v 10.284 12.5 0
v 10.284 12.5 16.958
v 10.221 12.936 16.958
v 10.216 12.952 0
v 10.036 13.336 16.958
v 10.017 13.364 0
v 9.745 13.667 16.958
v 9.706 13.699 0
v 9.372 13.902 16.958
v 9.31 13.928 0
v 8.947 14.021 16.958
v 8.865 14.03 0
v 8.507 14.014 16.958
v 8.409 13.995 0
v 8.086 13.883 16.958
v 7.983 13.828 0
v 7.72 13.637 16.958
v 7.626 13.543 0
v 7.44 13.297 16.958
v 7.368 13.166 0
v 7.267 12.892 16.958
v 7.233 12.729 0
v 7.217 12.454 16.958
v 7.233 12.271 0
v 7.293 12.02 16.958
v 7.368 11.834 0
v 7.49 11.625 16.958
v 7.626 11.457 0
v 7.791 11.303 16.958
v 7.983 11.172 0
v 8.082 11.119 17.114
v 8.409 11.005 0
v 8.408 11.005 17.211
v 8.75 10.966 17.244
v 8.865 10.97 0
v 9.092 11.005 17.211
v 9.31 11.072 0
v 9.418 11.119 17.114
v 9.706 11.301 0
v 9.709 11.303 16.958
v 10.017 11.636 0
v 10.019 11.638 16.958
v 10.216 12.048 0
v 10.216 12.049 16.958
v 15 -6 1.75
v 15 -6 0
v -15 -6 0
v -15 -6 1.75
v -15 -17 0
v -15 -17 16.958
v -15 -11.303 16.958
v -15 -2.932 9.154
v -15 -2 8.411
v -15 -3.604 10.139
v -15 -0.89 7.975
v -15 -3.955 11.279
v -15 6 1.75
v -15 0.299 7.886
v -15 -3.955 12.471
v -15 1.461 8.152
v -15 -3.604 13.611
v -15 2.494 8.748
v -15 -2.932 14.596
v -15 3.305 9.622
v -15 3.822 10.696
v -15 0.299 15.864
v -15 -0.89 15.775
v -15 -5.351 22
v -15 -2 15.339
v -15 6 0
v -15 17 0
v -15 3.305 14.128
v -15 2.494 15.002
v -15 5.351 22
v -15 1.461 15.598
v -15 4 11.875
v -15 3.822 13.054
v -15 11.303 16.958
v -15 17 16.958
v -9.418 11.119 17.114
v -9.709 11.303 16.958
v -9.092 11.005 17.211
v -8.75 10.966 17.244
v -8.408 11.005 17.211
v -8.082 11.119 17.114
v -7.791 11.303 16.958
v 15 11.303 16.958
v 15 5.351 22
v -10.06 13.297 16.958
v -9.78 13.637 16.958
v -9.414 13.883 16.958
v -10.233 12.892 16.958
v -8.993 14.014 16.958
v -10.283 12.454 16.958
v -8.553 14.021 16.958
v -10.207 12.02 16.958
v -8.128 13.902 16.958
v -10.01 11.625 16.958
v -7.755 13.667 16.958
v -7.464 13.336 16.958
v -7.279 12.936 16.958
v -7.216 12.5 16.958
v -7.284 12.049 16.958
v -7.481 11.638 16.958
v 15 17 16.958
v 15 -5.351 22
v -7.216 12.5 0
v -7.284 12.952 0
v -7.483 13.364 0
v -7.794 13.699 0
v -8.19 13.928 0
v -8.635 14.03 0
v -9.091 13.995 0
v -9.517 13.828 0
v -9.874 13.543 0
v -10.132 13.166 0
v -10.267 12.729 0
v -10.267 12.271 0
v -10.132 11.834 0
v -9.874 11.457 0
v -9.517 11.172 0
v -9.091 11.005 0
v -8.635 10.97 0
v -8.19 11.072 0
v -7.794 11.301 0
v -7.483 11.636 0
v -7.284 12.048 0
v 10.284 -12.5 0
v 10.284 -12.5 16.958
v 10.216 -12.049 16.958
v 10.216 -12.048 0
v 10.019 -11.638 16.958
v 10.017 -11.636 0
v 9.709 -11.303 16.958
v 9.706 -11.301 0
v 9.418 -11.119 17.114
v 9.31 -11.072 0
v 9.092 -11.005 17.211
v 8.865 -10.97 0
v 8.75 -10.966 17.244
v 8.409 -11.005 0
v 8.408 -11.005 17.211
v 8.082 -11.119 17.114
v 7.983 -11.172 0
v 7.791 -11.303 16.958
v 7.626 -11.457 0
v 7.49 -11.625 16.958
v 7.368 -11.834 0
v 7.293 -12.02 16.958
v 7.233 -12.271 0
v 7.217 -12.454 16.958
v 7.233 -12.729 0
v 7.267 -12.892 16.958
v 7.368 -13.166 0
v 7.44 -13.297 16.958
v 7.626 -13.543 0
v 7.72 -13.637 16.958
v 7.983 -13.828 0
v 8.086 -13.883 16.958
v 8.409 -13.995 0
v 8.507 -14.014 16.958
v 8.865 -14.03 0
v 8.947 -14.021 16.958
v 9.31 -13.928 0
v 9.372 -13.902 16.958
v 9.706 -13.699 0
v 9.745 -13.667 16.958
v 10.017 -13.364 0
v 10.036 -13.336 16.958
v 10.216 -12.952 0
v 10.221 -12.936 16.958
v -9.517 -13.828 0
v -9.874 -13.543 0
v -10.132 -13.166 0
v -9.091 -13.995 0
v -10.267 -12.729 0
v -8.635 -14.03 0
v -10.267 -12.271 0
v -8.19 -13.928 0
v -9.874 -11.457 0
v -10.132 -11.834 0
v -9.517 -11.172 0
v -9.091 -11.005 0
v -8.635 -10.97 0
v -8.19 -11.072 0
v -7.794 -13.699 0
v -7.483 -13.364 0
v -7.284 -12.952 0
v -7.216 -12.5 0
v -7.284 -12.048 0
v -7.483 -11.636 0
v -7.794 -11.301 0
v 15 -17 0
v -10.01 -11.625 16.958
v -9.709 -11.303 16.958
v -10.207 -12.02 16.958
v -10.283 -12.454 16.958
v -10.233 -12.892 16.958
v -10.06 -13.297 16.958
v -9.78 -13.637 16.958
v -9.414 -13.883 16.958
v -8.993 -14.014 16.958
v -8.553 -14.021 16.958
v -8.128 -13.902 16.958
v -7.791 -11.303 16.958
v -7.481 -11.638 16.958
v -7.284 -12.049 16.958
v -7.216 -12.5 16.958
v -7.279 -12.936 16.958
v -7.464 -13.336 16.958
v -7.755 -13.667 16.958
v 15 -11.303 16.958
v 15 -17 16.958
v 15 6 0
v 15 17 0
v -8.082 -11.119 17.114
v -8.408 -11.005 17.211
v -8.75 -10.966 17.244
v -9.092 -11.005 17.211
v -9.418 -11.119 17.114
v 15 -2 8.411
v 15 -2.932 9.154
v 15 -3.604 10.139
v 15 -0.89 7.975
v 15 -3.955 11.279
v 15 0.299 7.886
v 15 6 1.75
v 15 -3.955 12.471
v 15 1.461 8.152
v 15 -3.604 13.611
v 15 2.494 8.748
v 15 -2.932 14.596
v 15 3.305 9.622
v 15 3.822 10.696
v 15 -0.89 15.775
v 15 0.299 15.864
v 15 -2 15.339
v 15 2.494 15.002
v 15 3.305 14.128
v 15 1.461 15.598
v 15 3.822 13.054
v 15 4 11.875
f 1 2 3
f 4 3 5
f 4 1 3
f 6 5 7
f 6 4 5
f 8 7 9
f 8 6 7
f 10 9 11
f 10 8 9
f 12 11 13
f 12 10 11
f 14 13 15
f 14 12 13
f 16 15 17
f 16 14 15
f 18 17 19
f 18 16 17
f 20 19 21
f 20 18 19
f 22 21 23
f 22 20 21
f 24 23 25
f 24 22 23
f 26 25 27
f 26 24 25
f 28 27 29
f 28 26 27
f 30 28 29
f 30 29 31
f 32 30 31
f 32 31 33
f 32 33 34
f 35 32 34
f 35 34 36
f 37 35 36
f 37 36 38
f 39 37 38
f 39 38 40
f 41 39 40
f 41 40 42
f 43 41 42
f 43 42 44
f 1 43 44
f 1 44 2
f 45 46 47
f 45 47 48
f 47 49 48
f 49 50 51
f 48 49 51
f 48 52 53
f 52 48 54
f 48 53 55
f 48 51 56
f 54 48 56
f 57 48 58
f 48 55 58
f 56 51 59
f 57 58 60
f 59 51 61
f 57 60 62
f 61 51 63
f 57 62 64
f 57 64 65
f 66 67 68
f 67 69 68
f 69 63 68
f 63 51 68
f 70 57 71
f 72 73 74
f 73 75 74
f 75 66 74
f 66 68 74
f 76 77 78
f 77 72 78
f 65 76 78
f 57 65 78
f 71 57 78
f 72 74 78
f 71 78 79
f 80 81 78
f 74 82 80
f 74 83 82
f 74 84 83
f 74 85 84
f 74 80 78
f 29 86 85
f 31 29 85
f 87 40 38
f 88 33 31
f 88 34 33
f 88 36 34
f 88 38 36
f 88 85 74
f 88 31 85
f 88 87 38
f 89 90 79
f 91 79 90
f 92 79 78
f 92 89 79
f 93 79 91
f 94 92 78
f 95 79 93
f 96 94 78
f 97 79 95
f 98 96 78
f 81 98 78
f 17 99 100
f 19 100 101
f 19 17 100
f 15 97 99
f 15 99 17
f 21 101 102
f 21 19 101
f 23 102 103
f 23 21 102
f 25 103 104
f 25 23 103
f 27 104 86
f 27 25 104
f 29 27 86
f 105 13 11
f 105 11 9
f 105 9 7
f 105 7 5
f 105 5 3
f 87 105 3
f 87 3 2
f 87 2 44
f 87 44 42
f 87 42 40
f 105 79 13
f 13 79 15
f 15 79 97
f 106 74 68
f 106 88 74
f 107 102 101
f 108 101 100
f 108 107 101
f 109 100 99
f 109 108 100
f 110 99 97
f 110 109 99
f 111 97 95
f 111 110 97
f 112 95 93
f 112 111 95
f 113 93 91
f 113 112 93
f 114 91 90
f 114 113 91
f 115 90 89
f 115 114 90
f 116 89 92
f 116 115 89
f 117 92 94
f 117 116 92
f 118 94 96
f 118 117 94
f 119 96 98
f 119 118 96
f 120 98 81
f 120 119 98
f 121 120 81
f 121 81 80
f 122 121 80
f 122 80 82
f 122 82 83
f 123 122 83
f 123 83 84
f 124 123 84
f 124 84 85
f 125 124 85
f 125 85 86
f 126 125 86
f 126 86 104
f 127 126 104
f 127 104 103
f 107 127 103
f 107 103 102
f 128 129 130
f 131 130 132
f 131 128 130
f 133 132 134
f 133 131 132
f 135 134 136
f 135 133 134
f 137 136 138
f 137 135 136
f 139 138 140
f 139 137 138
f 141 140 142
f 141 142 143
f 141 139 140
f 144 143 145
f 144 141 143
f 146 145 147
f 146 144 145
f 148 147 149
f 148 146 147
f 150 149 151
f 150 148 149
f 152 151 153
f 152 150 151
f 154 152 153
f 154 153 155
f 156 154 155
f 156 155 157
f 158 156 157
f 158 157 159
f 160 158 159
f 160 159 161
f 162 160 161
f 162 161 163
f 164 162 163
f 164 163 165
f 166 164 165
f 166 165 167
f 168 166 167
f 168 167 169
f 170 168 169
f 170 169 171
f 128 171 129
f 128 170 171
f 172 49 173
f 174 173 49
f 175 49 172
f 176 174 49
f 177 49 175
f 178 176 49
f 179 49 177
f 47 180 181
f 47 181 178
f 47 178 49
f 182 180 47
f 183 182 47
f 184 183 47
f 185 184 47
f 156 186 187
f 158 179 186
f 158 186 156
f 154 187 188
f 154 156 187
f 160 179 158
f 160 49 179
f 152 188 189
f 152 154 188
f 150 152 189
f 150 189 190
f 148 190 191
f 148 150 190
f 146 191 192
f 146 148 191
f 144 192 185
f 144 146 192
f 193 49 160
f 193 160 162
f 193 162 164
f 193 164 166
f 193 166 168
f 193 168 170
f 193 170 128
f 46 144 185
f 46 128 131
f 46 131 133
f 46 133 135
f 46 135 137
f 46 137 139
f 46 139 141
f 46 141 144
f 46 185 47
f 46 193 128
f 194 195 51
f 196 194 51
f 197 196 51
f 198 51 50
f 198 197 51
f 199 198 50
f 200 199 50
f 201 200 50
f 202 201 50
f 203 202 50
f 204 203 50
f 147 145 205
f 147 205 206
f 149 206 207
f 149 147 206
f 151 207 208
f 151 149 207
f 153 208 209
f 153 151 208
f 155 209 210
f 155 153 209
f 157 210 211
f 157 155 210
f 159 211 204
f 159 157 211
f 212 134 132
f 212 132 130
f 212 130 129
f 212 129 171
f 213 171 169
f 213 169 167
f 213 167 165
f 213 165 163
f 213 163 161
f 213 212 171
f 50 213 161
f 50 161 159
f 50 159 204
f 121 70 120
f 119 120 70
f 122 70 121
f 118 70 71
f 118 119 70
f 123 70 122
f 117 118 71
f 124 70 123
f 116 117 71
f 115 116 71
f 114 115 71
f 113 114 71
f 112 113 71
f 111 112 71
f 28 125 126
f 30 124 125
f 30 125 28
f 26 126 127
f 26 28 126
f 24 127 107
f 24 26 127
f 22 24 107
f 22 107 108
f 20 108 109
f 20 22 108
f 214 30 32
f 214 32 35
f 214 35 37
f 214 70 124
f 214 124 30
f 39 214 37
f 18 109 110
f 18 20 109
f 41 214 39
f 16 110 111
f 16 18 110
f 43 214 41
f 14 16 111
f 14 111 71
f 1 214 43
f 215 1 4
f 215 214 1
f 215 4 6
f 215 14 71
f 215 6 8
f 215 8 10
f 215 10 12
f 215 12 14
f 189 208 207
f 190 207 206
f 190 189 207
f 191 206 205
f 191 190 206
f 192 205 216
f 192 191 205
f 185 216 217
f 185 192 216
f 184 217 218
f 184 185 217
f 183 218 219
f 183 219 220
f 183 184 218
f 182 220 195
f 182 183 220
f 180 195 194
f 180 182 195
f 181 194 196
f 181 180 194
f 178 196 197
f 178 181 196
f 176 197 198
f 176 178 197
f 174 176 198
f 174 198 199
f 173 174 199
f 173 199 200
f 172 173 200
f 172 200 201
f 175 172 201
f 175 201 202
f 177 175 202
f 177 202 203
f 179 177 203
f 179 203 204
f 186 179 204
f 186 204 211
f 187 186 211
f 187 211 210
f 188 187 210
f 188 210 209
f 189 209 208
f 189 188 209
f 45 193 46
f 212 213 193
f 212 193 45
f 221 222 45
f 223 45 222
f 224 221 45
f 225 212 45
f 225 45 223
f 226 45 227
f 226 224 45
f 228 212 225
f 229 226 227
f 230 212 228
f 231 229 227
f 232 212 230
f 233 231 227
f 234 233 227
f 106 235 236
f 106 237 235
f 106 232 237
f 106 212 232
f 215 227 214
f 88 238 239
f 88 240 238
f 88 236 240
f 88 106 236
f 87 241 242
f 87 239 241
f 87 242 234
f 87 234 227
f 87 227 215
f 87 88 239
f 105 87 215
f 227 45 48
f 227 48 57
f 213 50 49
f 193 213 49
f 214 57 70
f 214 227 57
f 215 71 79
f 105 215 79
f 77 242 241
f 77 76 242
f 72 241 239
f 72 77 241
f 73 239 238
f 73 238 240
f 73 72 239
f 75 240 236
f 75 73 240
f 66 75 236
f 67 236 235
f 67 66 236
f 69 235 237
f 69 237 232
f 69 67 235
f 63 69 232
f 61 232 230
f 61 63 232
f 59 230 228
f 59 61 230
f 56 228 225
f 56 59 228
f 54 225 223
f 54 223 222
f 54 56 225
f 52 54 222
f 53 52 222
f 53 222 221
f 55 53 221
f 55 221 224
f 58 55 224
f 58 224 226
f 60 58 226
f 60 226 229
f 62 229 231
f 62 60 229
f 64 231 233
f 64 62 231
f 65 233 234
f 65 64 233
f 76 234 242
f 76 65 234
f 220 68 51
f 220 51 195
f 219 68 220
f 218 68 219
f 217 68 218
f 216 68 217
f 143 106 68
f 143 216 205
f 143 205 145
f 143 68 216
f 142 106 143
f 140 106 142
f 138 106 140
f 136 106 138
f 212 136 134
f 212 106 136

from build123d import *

# Parameters (mm, degrees)
F0_R     = 4
F1_DEPTH = 15
F2_R     = 1.533854
F3_DEPTH = 25


with BuildPart() as f1:
    # F0 (on Right) → F1 (new body, symmetric)
    with BuildSketch(Plane.YZ):
        Polygon((5.351402, 22), (-5.351402, 22), (-11.303023, 16.958306), (-17, 16.958306), (-17, 0), (-6, 0), (-6, 1.75), (6, 1.75), (6, 0), (17, 0), (17, 16.958306), (11.303023, 16.958306), align=None)
        with Locations((0, 11.875)):
            Circle(F0_R, mode=Mode.SUBTRACT)
    extrude(amount=F1_DEPTH, both=True)

    # F2 (on Top) → F3 (cut)
    with BuildSketch(Plane.XY):
        with Locations((-8.75, -12.5)):
            Circle(F2_R)
        with Locations((-8.75, 12.5)):
            Circle(F2_R)
        with Locations((8.75, 12.5)):
            Circle(F2_R)
        with Locations((8.75, -12.5)):
            Circle(F2_R)
    extrude(amount=F3_DEPTH, mode=Mode.SUBTRACT)


solid = f1.part
